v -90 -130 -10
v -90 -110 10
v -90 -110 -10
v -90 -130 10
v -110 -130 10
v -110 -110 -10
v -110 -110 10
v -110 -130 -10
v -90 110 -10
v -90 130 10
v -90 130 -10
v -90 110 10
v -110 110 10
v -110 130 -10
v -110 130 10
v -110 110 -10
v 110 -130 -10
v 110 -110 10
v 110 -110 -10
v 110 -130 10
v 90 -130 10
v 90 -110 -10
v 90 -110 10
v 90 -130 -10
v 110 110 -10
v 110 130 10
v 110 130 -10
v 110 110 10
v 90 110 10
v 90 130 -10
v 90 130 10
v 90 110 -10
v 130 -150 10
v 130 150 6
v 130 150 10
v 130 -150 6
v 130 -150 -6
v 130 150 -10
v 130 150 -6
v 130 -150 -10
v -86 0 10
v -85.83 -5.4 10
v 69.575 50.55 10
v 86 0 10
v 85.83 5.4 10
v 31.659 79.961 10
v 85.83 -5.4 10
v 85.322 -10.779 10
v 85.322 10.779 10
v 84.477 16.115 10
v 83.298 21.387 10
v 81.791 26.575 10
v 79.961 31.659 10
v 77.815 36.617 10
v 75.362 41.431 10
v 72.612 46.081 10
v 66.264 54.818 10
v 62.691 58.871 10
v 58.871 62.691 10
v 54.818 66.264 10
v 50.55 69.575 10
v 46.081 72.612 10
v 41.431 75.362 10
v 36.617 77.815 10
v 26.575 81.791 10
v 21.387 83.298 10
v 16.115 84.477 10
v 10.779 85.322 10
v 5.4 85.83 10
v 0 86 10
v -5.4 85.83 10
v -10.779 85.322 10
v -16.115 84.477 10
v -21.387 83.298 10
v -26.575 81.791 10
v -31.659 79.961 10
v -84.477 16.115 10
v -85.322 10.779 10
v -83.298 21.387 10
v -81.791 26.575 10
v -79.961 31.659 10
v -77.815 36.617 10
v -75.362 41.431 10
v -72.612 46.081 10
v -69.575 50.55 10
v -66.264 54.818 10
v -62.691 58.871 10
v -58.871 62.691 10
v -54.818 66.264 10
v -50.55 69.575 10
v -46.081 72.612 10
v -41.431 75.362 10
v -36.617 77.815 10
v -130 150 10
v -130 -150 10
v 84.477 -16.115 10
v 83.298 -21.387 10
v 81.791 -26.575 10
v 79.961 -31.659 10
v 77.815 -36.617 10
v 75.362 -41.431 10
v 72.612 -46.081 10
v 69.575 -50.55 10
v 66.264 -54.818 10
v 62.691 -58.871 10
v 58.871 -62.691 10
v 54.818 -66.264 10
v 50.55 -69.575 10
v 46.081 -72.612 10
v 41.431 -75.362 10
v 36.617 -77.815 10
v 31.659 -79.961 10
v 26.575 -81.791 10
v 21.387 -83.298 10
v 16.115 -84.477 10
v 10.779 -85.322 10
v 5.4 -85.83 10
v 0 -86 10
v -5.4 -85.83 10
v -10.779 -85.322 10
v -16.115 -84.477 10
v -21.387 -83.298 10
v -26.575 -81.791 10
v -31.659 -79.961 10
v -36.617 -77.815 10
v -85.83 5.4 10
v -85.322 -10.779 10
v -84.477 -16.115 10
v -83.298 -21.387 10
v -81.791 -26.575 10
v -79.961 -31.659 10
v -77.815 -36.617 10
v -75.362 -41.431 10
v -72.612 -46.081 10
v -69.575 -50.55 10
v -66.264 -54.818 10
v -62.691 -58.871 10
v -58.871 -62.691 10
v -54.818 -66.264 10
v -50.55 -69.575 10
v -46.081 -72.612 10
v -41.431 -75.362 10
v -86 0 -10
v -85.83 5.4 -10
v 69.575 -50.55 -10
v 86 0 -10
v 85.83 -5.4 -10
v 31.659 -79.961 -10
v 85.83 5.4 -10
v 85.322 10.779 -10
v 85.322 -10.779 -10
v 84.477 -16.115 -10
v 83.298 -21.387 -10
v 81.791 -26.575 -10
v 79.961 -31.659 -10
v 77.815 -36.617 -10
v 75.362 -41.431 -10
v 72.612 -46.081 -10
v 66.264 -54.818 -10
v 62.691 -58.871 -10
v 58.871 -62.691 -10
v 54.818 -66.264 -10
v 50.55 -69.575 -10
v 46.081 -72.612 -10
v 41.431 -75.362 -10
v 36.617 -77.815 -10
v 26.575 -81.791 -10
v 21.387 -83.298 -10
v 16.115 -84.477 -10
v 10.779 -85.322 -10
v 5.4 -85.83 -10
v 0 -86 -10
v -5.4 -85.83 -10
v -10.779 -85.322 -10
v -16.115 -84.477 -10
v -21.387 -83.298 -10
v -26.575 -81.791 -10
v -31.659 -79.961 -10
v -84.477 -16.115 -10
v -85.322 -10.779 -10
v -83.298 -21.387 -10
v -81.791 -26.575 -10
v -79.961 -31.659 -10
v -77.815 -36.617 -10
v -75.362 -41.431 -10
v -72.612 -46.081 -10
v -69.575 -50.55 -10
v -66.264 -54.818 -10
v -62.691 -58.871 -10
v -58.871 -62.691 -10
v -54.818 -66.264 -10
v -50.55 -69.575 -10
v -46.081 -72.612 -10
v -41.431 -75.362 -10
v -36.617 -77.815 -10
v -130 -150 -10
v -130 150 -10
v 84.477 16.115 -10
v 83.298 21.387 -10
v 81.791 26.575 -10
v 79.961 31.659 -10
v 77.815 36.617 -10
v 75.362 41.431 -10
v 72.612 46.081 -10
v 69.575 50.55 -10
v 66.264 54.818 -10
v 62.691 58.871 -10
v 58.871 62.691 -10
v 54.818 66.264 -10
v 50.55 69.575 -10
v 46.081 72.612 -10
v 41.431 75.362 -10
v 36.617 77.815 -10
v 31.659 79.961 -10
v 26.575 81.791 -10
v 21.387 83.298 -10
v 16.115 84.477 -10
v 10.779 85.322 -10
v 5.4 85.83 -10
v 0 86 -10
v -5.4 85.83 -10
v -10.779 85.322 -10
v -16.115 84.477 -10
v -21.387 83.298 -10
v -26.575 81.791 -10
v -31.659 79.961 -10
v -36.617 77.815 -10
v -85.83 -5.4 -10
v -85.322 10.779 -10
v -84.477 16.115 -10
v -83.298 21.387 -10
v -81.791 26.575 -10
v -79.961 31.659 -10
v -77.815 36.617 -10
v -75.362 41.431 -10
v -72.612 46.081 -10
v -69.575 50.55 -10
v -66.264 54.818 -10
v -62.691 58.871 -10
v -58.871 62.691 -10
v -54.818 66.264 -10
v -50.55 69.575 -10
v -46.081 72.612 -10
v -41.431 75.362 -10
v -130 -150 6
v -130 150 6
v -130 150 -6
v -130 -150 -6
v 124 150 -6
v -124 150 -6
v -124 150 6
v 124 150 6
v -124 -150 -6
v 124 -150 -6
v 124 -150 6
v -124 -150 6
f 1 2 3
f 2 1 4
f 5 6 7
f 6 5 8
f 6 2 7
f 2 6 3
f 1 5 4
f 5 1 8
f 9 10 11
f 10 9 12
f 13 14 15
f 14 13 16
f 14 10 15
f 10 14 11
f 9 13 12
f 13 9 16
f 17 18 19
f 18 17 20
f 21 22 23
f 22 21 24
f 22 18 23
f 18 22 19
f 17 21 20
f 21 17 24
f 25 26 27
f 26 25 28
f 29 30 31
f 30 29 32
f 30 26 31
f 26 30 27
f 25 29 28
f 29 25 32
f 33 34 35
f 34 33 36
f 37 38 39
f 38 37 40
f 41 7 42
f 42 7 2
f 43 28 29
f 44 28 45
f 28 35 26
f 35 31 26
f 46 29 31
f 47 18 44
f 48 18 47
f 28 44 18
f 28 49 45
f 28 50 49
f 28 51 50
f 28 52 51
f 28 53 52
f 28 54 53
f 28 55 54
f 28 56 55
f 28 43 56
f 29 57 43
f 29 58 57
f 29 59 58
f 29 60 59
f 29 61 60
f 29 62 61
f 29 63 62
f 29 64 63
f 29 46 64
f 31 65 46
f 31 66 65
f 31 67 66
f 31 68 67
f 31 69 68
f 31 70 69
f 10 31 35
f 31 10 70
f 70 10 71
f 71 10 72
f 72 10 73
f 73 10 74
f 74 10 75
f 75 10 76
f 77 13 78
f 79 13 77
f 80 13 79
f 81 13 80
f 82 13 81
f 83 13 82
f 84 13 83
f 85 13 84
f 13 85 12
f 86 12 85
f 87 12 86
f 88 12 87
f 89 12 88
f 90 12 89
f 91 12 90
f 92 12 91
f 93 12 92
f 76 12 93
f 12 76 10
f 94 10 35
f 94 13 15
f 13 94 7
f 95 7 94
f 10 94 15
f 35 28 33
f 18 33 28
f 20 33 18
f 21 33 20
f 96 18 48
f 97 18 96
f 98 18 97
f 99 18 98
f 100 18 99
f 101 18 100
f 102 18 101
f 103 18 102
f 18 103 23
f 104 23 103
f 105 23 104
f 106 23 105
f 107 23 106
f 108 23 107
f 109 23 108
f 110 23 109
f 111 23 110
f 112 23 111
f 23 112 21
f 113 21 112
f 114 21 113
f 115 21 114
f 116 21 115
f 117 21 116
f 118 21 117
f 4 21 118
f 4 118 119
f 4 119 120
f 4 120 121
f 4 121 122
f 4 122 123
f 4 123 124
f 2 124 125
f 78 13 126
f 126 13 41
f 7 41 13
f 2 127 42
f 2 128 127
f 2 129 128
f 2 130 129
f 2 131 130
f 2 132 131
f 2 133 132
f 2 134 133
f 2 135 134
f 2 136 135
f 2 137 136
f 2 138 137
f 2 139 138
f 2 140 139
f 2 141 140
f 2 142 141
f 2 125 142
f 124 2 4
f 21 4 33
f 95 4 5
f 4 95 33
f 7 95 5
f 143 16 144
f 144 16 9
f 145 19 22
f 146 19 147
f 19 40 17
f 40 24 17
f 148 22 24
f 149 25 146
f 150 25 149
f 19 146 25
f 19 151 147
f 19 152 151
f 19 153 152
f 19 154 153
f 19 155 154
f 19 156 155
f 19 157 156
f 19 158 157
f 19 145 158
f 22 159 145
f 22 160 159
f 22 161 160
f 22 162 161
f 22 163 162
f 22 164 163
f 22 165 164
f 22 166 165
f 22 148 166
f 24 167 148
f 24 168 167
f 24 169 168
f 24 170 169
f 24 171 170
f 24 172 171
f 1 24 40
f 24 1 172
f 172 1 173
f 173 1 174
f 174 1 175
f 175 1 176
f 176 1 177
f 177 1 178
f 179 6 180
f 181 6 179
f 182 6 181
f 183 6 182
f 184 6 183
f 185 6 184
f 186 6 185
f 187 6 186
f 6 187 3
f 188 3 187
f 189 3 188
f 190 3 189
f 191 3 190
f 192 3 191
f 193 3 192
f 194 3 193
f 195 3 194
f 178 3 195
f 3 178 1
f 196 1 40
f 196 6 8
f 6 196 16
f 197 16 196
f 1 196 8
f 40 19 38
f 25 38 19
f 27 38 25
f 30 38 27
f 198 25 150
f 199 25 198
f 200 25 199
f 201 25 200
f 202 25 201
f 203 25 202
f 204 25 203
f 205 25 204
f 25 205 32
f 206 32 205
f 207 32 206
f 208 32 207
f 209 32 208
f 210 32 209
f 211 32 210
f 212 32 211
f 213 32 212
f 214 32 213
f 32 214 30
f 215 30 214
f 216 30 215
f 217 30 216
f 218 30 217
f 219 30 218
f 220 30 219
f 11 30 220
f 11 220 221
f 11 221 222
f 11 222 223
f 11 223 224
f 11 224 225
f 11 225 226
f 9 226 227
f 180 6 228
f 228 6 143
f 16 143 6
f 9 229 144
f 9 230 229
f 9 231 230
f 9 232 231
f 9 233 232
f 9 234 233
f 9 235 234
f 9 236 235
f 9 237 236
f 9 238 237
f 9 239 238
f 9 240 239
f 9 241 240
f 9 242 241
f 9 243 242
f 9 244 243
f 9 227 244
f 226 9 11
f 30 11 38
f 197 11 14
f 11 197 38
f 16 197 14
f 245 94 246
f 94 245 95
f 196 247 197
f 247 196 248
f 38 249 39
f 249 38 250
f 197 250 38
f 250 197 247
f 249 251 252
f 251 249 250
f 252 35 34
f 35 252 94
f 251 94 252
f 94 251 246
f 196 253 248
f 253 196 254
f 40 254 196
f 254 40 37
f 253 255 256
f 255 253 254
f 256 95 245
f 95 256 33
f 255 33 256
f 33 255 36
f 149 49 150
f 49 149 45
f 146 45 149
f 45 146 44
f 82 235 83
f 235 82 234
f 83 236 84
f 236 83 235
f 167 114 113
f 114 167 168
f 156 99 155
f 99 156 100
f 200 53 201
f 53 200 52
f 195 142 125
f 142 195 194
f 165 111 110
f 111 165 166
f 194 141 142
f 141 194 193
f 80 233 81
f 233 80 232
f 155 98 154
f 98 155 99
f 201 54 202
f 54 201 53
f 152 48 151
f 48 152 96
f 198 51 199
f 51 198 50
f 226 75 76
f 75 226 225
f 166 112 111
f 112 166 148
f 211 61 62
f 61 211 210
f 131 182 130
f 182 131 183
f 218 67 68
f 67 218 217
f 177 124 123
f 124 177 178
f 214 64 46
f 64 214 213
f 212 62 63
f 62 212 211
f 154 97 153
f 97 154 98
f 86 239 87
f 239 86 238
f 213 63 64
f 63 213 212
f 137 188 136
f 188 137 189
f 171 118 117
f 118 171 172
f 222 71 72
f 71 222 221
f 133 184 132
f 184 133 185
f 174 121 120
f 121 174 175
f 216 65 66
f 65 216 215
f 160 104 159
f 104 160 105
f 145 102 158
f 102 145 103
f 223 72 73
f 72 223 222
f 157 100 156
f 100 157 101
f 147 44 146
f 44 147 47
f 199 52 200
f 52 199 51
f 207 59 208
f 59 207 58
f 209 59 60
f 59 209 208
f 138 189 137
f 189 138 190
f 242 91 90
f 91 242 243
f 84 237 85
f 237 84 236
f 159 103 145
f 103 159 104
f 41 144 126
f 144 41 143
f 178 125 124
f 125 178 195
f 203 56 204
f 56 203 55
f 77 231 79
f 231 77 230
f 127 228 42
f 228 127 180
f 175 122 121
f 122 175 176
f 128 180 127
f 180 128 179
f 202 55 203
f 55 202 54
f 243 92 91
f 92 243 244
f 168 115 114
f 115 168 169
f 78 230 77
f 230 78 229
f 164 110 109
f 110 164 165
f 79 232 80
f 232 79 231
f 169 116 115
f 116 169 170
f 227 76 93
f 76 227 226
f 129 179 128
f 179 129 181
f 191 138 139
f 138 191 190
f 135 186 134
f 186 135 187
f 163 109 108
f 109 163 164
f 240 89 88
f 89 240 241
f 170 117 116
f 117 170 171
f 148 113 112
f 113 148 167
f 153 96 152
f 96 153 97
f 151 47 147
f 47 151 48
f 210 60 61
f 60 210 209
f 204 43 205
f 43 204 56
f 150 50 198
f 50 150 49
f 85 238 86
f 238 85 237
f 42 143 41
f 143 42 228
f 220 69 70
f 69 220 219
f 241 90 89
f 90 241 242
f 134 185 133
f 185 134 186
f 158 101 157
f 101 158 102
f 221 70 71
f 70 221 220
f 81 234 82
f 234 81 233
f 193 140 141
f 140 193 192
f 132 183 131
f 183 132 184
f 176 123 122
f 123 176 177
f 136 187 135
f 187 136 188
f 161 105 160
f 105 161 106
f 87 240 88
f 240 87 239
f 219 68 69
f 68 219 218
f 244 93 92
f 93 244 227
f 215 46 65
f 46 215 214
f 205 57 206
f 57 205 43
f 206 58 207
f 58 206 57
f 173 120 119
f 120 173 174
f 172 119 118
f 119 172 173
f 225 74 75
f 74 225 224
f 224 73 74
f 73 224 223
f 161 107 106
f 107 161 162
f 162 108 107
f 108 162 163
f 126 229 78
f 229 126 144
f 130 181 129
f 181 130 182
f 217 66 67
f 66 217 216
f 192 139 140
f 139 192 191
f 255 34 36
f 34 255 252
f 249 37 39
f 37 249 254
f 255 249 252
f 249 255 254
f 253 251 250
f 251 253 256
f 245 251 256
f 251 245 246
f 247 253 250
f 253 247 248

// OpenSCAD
/*
    OpenERV Universal Window Mount
    Parametric Design Script
    Version: 1.1 (Optimized for Pioneer ECOasis 50)
*/

// --- USER PARAMETERS ---
pipe_diameter = 160;      // Pioneer ECOasis 50 uses 160mm
panel_height = 300;       // Increased for 5kg load stability
panel_thickness = 20;     // Increased for Pioneer's 11lb weight
clearance = 0.5;          // Fit tolerance
pioneer_mode = true;      // Adds reinforced mounting zone for Pioneer plate

// --- INTERNAL CALCULATIONS ---
collar_outer = pipe_diameter + 30;
core_width = pioneer_mode ? 260 : 220; // Extra width for Pioneer footprint
slider_width = 300;

// --- MODULES ---

module core_plate() {
    difference() {
        // Main Body
        cube([core_width, panel_height, panel_thickness], center=true);
        
        // Pipe Hole (172mm for 160mm pipe + 12mm clearance/seal)
        cylinder(h=panel_thickness+2, d=pipe_diameter + 12, center=true, $fn=100);
        
        // Pioneer Safe-Drill Zones (Thin slots to mark 100% infill areas)
        if(pioneer_mode) {
            for(x=[-100, 100]) for(y=[-120, 120]) {
                translate([x, y, 0]) cube([20, 20, panel_thickness+2], center=true);
            }
        }
        
        // Slider Tracks (Grooves)
        translate([core_width/2, 0, 0]) cube([12, panel_height+2, panel_thickness-8], center=true);
        translate([-core_width/2, 0, 0]) cube([12, panel_height+2, panel_thickness-8], center=true);
    }
}

module extension_slider() {
    difference() {
        cube([slider_width, panel_height, panel_thickness-2], center=true);
        
        // Adjustment Slots (M5)
        for(x=[-slider_width/3, 0, slider_width/3]) {
            translate([x, 0, 0])
                hull() {
                    translate([0, -20, 0]) cylinder(h=panel_thickness+10, d=5.5, center=true, $fn=20);
                    translate([0, 20, 0]) cylinder(h=panel_thickness+10, d=5.5, center=true, $fn=20);
                }
        }
    }
    // Tongue for the groove
    translate([-slider_width/2 - 4, 0, 0])
        cube([8, panel_height-2, panel_thickness-10], center=true);
}

module sill_support_pioneer() {
    // Heavy duty triangular brace
    difference() {
        union() {
            cube([40, 40, 200]); // Main vertical column
            translate([0,0,0]) rotate([0,45,0]) cube([40, 40, 250]); // Angle brace
        }
        // Bolt holes for M6 hardware
        translate([20, 20, 20]) rotate([0,90,0]) cylinder(h=50, d=6.5, center=true);
    }
}

// --- GENERATION ---
core_plate();
